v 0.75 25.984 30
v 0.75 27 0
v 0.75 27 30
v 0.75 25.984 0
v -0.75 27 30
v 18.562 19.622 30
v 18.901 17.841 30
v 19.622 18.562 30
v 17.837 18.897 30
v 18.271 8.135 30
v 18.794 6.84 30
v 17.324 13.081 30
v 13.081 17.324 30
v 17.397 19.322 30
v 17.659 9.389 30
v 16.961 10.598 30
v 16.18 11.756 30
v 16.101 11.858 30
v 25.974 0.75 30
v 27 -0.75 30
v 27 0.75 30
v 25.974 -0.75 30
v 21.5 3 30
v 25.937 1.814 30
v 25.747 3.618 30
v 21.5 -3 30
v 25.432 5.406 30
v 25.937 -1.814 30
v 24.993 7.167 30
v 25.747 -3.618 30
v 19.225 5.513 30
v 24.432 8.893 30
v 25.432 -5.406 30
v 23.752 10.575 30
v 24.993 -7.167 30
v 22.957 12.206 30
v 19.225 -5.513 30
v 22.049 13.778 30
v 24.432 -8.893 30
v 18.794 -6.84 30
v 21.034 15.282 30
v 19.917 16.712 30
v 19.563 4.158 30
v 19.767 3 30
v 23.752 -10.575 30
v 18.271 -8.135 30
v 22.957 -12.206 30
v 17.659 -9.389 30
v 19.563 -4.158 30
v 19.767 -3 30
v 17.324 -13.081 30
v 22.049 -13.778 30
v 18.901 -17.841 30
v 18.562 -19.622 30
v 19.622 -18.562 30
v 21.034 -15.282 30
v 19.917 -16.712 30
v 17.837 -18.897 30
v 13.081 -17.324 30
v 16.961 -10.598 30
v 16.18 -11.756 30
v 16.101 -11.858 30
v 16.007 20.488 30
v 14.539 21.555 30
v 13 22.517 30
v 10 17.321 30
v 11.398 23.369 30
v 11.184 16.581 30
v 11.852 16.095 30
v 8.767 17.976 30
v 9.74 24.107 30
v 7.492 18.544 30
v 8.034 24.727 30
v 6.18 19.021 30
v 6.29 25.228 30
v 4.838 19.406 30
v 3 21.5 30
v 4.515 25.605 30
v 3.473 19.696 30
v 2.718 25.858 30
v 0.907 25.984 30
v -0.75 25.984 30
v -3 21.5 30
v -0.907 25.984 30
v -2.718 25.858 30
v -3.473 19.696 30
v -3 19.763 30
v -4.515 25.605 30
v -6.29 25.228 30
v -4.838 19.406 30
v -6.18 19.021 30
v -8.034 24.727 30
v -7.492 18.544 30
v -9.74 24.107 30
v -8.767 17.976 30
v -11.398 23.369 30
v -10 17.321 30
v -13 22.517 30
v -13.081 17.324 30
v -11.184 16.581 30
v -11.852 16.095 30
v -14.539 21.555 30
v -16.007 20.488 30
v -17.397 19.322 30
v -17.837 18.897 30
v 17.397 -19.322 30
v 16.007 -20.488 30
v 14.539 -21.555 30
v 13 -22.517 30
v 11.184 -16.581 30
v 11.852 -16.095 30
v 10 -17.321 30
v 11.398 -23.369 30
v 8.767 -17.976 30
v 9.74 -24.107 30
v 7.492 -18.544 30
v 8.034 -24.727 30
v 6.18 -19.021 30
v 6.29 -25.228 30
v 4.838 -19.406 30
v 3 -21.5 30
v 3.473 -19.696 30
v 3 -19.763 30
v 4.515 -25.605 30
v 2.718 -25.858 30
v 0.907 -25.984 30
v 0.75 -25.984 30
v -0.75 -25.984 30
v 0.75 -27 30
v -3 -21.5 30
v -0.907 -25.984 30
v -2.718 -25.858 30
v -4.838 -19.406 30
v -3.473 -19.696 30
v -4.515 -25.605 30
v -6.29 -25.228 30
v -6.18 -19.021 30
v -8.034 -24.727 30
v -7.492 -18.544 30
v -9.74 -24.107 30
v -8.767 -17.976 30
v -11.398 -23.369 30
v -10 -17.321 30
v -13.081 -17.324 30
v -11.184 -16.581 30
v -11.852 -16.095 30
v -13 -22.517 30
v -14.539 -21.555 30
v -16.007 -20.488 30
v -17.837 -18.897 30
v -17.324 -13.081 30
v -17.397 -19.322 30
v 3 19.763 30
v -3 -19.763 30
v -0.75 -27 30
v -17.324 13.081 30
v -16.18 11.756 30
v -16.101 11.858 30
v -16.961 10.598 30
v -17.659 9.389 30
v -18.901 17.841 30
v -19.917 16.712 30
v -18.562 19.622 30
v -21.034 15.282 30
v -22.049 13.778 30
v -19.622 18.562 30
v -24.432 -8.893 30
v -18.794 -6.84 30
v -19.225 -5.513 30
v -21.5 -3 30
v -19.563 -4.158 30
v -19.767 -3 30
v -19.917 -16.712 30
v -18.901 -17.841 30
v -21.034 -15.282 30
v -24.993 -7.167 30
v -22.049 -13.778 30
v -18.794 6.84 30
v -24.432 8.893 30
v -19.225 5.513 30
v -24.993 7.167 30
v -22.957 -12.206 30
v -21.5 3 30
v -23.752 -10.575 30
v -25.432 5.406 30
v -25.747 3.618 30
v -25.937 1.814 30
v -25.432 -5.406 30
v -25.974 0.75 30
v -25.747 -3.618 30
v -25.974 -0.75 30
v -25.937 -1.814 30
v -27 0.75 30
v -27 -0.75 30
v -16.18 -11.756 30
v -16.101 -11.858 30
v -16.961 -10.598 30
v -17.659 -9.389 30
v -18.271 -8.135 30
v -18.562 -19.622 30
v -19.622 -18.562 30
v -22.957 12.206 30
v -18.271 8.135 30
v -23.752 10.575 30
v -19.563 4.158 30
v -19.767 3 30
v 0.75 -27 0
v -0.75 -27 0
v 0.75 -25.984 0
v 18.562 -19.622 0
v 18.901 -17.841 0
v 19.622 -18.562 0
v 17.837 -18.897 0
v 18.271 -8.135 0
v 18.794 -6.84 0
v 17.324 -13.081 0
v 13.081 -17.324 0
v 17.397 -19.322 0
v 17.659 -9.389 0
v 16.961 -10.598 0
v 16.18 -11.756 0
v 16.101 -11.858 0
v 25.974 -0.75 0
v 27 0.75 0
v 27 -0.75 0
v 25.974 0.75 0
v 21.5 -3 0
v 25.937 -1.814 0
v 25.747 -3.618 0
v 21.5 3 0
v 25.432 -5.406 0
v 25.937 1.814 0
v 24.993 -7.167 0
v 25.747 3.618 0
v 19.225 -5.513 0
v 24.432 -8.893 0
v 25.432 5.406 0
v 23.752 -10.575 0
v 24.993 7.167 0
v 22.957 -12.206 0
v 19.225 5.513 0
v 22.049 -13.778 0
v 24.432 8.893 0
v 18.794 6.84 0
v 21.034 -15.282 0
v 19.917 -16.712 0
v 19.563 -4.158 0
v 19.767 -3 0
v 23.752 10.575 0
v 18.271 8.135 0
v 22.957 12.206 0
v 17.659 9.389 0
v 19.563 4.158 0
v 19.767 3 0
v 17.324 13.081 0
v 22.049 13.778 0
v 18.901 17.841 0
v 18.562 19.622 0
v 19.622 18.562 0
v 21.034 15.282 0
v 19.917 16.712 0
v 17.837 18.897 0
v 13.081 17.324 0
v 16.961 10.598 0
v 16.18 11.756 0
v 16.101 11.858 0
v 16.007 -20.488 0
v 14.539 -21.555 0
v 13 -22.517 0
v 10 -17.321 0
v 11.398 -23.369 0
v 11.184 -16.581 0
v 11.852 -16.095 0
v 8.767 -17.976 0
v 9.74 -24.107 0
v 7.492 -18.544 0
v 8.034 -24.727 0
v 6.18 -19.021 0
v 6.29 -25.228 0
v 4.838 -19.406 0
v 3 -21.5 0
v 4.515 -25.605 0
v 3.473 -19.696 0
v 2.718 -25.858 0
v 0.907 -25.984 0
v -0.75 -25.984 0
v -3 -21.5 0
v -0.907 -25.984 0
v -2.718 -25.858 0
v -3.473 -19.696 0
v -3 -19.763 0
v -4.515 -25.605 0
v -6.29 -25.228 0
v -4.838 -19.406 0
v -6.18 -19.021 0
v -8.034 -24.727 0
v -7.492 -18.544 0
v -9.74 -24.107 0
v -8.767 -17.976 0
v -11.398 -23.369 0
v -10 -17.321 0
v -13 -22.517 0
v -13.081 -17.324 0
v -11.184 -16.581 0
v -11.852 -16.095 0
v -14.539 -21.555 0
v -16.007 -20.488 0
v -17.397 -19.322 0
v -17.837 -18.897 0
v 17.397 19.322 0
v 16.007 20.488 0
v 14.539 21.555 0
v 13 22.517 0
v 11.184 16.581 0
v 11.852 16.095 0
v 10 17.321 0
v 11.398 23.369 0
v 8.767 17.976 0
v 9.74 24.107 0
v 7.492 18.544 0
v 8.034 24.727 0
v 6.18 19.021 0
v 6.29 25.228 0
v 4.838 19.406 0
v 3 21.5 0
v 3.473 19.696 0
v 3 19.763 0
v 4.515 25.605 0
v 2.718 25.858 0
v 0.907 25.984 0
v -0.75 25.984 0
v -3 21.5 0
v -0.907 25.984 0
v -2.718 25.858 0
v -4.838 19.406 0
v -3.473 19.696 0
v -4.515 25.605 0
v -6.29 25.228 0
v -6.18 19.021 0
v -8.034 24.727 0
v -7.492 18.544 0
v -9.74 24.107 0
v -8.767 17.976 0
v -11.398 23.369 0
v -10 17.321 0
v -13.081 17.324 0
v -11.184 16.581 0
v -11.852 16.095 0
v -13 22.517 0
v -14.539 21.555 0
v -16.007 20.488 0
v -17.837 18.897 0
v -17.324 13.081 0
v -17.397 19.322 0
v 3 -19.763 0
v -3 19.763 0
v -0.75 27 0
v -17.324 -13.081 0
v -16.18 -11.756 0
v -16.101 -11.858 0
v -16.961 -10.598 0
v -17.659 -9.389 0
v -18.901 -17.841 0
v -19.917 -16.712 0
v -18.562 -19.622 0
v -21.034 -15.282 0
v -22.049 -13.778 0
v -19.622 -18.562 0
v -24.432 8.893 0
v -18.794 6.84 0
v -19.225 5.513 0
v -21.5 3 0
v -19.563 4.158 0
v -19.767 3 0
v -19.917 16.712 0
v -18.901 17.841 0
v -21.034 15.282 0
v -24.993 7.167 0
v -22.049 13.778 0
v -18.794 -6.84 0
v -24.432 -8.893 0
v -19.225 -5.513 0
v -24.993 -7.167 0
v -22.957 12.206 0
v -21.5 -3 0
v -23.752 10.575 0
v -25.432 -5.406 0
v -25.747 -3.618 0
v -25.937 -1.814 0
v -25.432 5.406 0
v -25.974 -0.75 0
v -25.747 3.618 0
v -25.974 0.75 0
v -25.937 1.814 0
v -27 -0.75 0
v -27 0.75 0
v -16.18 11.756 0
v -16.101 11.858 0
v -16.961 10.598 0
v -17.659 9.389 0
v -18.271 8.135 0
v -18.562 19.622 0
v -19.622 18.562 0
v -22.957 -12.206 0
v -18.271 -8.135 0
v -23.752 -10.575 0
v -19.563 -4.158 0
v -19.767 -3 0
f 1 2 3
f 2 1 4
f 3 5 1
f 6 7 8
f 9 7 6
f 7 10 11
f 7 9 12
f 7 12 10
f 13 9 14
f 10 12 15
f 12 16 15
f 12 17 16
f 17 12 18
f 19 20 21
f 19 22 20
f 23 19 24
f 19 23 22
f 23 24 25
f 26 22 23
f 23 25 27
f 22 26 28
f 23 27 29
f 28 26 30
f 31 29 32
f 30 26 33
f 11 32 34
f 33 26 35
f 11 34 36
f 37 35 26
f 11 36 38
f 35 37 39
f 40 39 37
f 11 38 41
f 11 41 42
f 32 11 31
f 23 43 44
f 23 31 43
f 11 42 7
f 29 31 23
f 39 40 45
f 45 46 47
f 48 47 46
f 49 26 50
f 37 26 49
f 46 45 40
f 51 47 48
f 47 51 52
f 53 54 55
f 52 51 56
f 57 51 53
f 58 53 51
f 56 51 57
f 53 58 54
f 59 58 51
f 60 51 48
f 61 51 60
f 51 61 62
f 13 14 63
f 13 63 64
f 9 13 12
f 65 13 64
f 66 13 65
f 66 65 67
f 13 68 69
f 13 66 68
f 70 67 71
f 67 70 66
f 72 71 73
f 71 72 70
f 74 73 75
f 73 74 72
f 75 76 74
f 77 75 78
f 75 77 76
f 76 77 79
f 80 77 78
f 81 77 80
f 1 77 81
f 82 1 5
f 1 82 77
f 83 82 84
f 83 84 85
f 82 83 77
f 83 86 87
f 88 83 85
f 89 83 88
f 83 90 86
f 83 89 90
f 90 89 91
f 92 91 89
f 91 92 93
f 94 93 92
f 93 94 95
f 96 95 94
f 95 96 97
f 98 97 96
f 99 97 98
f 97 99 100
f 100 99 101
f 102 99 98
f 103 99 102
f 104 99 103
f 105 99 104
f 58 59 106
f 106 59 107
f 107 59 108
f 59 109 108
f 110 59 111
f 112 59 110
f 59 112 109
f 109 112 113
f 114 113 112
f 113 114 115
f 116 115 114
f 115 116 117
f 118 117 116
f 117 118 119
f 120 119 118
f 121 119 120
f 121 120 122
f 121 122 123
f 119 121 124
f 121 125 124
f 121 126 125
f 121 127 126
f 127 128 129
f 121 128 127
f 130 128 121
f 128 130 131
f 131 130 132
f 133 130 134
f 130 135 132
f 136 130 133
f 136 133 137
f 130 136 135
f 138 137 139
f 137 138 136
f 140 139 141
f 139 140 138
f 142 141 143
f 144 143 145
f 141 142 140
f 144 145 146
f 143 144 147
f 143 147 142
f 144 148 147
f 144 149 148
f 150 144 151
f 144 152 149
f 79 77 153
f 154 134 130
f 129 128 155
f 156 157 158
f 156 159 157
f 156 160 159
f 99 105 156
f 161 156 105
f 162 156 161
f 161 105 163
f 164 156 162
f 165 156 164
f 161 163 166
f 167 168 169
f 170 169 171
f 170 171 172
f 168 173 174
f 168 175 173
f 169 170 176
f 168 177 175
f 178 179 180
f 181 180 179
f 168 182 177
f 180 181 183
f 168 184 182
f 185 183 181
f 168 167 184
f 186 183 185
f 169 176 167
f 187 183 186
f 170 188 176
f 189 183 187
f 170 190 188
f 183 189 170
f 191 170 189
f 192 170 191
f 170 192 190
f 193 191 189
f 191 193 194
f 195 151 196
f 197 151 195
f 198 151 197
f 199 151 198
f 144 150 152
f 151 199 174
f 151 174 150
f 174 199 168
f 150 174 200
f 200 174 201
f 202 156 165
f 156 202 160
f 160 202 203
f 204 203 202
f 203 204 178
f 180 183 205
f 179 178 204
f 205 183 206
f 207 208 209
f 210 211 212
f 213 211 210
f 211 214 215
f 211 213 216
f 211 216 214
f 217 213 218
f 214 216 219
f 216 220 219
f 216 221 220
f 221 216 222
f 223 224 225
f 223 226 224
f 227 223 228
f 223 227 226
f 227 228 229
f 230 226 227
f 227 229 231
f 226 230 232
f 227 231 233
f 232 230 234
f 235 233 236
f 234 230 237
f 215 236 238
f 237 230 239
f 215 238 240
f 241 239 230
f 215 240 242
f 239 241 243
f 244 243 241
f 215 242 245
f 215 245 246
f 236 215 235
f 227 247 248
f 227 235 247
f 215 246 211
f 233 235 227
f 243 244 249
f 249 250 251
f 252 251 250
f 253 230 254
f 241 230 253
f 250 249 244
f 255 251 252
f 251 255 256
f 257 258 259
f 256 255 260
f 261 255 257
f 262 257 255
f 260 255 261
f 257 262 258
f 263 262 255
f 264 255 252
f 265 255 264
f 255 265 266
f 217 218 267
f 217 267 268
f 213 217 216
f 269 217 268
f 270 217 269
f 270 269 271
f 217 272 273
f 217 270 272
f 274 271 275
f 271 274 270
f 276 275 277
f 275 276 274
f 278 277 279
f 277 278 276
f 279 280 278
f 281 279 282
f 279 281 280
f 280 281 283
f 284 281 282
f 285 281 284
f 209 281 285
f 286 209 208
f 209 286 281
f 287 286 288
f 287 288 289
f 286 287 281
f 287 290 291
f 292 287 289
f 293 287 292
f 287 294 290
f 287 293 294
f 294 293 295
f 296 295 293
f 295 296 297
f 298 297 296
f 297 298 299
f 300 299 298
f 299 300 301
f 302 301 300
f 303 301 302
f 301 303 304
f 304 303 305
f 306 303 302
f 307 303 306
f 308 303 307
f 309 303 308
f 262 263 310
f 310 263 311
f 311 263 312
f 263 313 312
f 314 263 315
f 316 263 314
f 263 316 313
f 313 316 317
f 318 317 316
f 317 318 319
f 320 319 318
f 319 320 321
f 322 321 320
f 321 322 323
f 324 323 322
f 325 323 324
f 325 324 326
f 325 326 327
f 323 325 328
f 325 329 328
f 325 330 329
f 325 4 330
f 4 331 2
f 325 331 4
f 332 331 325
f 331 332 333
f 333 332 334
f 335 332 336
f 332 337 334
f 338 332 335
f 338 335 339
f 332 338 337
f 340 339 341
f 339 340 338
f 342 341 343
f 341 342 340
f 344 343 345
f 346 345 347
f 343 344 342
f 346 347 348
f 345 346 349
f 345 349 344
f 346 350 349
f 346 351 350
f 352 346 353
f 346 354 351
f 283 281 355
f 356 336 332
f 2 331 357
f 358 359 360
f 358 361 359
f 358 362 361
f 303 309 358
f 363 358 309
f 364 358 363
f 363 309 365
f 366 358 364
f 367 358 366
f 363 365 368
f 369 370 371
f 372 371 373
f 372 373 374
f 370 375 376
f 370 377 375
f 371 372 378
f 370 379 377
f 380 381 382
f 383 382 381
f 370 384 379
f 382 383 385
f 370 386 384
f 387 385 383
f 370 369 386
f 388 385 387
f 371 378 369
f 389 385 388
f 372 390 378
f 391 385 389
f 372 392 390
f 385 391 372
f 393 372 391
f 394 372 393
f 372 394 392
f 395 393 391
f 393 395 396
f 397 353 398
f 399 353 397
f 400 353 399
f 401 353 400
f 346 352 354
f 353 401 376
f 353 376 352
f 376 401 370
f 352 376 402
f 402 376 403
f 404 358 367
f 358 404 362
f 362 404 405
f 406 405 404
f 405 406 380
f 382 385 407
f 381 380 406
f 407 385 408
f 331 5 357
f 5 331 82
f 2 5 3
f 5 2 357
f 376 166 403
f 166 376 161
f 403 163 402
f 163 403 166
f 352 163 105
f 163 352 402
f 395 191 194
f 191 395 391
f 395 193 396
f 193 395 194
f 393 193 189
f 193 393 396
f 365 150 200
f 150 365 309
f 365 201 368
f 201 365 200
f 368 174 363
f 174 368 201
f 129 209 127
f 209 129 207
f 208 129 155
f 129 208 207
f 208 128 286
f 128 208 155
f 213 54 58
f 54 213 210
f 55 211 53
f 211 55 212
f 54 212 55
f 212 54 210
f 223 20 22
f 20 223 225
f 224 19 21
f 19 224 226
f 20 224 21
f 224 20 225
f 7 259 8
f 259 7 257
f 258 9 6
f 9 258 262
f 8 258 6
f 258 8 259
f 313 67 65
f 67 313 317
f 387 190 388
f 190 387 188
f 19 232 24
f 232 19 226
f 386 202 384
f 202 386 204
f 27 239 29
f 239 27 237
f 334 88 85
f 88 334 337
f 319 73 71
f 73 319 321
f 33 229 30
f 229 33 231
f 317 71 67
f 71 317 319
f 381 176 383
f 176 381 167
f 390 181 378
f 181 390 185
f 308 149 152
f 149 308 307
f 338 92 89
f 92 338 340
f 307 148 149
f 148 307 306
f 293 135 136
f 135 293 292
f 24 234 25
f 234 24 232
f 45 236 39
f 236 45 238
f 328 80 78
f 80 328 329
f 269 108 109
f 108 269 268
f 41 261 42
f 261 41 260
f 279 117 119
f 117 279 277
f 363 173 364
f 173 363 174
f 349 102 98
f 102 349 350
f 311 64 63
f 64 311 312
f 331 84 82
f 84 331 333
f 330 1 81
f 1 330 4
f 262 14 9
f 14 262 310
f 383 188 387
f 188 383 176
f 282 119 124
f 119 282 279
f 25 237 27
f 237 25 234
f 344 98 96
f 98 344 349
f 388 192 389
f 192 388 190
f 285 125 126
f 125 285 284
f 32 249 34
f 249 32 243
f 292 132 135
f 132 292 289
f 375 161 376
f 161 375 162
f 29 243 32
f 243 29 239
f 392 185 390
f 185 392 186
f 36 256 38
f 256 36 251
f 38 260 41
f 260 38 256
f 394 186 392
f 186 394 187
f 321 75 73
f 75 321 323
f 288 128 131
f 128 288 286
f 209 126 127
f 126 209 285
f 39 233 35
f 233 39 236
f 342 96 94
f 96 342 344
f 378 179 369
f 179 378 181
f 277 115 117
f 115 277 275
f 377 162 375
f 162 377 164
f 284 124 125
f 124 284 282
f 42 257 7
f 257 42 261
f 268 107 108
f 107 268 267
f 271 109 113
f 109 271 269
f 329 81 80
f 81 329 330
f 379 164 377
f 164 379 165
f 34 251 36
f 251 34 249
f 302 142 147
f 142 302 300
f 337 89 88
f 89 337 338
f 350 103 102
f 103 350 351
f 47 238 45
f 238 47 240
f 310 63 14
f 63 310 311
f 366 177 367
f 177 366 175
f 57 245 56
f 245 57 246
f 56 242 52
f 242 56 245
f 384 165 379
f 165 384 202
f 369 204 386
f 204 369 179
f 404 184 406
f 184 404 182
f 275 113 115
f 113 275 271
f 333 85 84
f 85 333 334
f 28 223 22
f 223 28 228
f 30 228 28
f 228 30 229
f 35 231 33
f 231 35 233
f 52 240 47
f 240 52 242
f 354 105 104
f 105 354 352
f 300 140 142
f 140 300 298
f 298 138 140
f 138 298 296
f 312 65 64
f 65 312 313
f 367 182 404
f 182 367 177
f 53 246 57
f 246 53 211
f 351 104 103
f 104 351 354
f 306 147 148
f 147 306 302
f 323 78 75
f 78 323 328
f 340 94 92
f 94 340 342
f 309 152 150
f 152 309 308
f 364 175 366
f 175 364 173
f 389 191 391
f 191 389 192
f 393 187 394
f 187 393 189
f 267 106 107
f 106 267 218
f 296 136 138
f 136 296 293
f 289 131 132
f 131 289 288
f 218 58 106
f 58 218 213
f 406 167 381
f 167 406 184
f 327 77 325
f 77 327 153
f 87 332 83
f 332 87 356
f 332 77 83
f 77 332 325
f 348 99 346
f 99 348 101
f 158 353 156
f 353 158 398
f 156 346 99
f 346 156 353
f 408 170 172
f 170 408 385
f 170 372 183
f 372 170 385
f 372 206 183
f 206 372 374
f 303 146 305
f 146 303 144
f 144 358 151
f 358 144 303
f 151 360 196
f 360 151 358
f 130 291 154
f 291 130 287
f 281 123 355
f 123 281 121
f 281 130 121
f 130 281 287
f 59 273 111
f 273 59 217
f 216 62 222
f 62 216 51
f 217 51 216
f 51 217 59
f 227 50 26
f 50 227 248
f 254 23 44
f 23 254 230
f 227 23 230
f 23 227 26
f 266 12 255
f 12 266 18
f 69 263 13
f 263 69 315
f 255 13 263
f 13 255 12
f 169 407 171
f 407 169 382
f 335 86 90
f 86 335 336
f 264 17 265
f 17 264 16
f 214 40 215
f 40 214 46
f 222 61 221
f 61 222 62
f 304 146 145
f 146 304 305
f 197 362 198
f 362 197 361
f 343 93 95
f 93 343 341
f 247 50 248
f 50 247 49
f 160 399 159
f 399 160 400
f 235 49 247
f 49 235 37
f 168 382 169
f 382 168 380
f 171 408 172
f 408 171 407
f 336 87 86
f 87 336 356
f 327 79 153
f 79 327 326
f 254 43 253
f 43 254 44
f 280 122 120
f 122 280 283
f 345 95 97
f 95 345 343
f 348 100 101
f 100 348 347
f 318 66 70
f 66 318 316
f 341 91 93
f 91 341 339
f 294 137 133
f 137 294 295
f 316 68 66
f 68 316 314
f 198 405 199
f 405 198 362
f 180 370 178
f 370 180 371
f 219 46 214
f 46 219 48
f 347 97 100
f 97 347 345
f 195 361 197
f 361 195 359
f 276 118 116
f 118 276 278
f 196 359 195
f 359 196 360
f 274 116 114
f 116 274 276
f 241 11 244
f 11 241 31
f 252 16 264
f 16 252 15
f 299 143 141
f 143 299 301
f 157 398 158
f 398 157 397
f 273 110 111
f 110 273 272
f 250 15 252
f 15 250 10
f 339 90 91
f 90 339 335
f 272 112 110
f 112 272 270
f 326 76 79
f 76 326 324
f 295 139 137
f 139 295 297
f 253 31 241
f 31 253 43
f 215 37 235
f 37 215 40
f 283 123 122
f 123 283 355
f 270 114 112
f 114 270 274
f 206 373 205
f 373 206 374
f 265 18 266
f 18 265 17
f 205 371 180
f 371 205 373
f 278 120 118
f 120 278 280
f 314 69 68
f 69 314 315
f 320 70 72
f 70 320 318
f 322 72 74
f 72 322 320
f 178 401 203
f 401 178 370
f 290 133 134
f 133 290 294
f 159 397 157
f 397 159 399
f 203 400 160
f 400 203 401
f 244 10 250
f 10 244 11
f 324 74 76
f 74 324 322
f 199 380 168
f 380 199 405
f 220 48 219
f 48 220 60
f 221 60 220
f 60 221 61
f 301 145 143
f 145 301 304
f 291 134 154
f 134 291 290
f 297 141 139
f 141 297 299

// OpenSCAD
/*
    Drill bit storage
*/

$fn=90;  // accuracy
outerR = 52/2;  // 5.2
innerR = 41/2-1+0.5;
lenght = 30; //2.5

pegWidth1 = 1.5;
pegWidth2 = 6;
pegDepth1 = outerR+1;
pegDepth2 = innerR+1.5;

module peg (pegDepth,
    pegWidth,l){
    for(i = [0:45:360])
    rotate([0,0,i])
    translate([
    -pegWidth/2,0,0]) 
    cube([pegWidth,
    pegDepth,
    l]);
}


difference () {

union () {
peg (pegDepth1,
    pegWidth1,lenght);
cylinder(
    h = lenght,
    r = outerR
    );
}    

translate([0,0,-1])
union () {
peg (pegDepth2,
    pegWidth2,lenght+2);
cylinder(
    h = lenght+2,
    r = innerR
    );
}

}
